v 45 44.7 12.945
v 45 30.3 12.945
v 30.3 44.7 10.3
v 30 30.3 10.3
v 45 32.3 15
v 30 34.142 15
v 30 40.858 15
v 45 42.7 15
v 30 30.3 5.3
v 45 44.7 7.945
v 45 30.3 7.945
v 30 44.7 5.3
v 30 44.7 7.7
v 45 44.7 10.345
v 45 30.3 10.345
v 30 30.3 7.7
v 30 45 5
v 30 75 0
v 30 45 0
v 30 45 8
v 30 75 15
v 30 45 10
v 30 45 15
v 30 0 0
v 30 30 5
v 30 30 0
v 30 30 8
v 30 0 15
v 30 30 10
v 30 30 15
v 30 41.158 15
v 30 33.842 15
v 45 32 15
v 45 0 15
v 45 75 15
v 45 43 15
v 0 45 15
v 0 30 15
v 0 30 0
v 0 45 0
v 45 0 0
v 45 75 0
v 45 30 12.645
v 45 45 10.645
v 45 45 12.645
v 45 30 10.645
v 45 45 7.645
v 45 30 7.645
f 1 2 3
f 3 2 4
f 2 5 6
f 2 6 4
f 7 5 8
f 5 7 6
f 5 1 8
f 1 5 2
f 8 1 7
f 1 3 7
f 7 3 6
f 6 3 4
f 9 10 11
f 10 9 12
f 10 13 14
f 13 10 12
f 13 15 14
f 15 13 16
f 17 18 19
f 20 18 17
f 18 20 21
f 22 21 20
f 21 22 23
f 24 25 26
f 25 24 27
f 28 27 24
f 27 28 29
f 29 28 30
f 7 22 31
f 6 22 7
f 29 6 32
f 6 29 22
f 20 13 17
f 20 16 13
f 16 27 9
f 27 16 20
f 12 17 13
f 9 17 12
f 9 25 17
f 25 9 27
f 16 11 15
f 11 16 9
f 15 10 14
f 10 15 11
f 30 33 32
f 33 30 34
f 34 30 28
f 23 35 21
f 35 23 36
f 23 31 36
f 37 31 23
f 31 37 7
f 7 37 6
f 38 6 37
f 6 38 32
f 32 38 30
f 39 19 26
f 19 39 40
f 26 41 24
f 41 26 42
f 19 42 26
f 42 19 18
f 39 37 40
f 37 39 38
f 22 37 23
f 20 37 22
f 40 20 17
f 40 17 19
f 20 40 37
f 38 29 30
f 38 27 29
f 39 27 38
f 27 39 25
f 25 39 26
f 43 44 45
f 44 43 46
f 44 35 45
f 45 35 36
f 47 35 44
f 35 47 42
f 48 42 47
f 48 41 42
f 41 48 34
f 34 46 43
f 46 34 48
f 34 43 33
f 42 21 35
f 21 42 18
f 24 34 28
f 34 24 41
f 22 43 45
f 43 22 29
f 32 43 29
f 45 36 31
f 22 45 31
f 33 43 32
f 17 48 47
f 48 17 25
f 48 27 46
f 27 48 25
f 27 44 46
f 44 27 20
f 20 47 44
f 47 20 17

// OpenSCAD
// 蟻ほぞ差し仕口 / 蟻二枚枘差し仕口
//


size=15;
// size dictates the overall dimensions. By default the combined structure
// will have a shape that resembles the following (when viewed from the z axis):
//
//      _
//     |_|
//  _ _|_|_ _
// |_|_|_|_|_|
// 
// where each cube has the dimensions [size, size, size]

leeway=size*0.02;

function x_leeway(leeway) = [leeway, 0, 0];
function y_leeway(leeway) = [0, leeway, 0];
function z_leeway(leeway) = [0, 0, leeway];
function xy_leeway(leeway) = x_leeway(leeway) + y_leeway(leeway);
function xz_leeway(leeway) = x_leeway(leeway) + z_leeway(leeway);
function yz_leeway(leeway) = y_leeway(leeway) + z_leeway(leeway);
function xyz_leeway(leeway) = x_leeway(leeway) + y_leeway(leeway) + z_leeway(leeway);

cube_faces=[
  [0,1,2,3],  // bottom
  [4,5,1,0],  // front
  [7,6,5,4],  // top
  [5,6,2,1],  // right
  [6,7,3,2],  // back
  [7,4,0,3] // left
];
    
module top_ari(leeway=size*0.02) {
    width=size; // width of the bar
    height=size; // height of the ari
    ari_depth=size/3;
    ari_top_width=11; // width of the base of ari, on the top size
    ari_top_slant=7; // angle from base of ari, on the top side
    ari_bottom_vertical_slant=10; // vertical angle from bottom of side ari
    ari_bottom_horizontal_slant=0; // horizontal angle
    
    // pre-calculate some re-used stuff for ease of use

    // amount that is shifted horizontally from the baseline
    // when given the slant angle in the bottom side
    ari_bottom_horizontal_delta=tan(ari_bottom_horizontal_slant)*height;
    
    // amount that is shifted vertically from the baseline
    // when given the slant angle in the bottom side
    ari_bottom_vertical_delta=tan(ari_bottom_vertical_slant)*height;
    
    
    ari_top_horizontal_delta=tan(ari_top_slant)*height;
    ari_top_baseline=(width-ari_top_width)/2;
    

    

    polyhedron(
        points=[
            [0, 0, 0]+yz_leeway(leeway),
            [height, ari_bottom_horizontal_delta, ari_bottom_vertical_delta]+yz_leeway(leeway),
            [height, width-ari_bottom_horizontal_delta, ari_bottom_vertical_delta]-y_leeway(leeway) + z_leeway(leeway),
            [0, width, 0]-y_leeway(leeway)+xz_leeway(leeway),
            
            [0, ari_top_baseline+ari_top_horizontal_delta, ari_depth] + y_leeway(leeway),
            [height, ari_top_baseline, ari_depth]+y_leeway(leeway),
            [height, width-ari_top_baseline, ari_depth]-y_leeway(leeway),
            [0, width-(ari_top_baseline+ari_top_horizontal_delta), ari_depth]-y_leeway(leeway)
        ],
        faces=cube_faces
    );
}

module bottom_ari(leeway=size*0.02) {
    height=size;
    ari_depth=size/5;
    vertical_slant=10;
    
    ari_vertical_delta=tan(vertical_slant)*height;
    polyhedron(
        points=[
            [0, 0, 0]+yz_leeway(leeway),
            [size, 0, ari_vertical_delta]+yz_leeway(leeway),
            [size, size,ari_vertical_delta]-y_leeway(leeway)+z_leeway(leeway),
            [0, size, 0]-y_leeway(leeway)+z_leeway(leeway),
            [0, 0, ari_depth]+y_leeway(leeway)-z_leeway(leeway),
            [size, 0, ari_depth+ari_vertical_delta]+y_leeway(leeway)-z_leeway(leeway),
            [size, size, ari_depth+ari_vertical_delta]-yz_leeway(leeway),
            [0, size, ari_depth]-y_leeway(leeway)-z_leeway(leeway),
        ],
        faces=cube_faces
    );
}

module male() {
    cube([size*2, size, size]);
    translate([size*2, 0, 0]) {
        translate([0, 0, size*2/3]) top_ari();
        translate([0, 0, size/3]) bottom_ari();
    }
}

module female() {
    render()
        difference() {
            cube([size, size*5, size]);
            translate([0, size*2, size*2/3]) top_ari(leeway=0);
            translate([0, size*2, size/3]) bottom_ari(leeway=0);
        }
   
}

color("Red", 1) translate([0, size*2, 0]) male();
color("Green", 1) translate([size*2, 0, 0]) female();
